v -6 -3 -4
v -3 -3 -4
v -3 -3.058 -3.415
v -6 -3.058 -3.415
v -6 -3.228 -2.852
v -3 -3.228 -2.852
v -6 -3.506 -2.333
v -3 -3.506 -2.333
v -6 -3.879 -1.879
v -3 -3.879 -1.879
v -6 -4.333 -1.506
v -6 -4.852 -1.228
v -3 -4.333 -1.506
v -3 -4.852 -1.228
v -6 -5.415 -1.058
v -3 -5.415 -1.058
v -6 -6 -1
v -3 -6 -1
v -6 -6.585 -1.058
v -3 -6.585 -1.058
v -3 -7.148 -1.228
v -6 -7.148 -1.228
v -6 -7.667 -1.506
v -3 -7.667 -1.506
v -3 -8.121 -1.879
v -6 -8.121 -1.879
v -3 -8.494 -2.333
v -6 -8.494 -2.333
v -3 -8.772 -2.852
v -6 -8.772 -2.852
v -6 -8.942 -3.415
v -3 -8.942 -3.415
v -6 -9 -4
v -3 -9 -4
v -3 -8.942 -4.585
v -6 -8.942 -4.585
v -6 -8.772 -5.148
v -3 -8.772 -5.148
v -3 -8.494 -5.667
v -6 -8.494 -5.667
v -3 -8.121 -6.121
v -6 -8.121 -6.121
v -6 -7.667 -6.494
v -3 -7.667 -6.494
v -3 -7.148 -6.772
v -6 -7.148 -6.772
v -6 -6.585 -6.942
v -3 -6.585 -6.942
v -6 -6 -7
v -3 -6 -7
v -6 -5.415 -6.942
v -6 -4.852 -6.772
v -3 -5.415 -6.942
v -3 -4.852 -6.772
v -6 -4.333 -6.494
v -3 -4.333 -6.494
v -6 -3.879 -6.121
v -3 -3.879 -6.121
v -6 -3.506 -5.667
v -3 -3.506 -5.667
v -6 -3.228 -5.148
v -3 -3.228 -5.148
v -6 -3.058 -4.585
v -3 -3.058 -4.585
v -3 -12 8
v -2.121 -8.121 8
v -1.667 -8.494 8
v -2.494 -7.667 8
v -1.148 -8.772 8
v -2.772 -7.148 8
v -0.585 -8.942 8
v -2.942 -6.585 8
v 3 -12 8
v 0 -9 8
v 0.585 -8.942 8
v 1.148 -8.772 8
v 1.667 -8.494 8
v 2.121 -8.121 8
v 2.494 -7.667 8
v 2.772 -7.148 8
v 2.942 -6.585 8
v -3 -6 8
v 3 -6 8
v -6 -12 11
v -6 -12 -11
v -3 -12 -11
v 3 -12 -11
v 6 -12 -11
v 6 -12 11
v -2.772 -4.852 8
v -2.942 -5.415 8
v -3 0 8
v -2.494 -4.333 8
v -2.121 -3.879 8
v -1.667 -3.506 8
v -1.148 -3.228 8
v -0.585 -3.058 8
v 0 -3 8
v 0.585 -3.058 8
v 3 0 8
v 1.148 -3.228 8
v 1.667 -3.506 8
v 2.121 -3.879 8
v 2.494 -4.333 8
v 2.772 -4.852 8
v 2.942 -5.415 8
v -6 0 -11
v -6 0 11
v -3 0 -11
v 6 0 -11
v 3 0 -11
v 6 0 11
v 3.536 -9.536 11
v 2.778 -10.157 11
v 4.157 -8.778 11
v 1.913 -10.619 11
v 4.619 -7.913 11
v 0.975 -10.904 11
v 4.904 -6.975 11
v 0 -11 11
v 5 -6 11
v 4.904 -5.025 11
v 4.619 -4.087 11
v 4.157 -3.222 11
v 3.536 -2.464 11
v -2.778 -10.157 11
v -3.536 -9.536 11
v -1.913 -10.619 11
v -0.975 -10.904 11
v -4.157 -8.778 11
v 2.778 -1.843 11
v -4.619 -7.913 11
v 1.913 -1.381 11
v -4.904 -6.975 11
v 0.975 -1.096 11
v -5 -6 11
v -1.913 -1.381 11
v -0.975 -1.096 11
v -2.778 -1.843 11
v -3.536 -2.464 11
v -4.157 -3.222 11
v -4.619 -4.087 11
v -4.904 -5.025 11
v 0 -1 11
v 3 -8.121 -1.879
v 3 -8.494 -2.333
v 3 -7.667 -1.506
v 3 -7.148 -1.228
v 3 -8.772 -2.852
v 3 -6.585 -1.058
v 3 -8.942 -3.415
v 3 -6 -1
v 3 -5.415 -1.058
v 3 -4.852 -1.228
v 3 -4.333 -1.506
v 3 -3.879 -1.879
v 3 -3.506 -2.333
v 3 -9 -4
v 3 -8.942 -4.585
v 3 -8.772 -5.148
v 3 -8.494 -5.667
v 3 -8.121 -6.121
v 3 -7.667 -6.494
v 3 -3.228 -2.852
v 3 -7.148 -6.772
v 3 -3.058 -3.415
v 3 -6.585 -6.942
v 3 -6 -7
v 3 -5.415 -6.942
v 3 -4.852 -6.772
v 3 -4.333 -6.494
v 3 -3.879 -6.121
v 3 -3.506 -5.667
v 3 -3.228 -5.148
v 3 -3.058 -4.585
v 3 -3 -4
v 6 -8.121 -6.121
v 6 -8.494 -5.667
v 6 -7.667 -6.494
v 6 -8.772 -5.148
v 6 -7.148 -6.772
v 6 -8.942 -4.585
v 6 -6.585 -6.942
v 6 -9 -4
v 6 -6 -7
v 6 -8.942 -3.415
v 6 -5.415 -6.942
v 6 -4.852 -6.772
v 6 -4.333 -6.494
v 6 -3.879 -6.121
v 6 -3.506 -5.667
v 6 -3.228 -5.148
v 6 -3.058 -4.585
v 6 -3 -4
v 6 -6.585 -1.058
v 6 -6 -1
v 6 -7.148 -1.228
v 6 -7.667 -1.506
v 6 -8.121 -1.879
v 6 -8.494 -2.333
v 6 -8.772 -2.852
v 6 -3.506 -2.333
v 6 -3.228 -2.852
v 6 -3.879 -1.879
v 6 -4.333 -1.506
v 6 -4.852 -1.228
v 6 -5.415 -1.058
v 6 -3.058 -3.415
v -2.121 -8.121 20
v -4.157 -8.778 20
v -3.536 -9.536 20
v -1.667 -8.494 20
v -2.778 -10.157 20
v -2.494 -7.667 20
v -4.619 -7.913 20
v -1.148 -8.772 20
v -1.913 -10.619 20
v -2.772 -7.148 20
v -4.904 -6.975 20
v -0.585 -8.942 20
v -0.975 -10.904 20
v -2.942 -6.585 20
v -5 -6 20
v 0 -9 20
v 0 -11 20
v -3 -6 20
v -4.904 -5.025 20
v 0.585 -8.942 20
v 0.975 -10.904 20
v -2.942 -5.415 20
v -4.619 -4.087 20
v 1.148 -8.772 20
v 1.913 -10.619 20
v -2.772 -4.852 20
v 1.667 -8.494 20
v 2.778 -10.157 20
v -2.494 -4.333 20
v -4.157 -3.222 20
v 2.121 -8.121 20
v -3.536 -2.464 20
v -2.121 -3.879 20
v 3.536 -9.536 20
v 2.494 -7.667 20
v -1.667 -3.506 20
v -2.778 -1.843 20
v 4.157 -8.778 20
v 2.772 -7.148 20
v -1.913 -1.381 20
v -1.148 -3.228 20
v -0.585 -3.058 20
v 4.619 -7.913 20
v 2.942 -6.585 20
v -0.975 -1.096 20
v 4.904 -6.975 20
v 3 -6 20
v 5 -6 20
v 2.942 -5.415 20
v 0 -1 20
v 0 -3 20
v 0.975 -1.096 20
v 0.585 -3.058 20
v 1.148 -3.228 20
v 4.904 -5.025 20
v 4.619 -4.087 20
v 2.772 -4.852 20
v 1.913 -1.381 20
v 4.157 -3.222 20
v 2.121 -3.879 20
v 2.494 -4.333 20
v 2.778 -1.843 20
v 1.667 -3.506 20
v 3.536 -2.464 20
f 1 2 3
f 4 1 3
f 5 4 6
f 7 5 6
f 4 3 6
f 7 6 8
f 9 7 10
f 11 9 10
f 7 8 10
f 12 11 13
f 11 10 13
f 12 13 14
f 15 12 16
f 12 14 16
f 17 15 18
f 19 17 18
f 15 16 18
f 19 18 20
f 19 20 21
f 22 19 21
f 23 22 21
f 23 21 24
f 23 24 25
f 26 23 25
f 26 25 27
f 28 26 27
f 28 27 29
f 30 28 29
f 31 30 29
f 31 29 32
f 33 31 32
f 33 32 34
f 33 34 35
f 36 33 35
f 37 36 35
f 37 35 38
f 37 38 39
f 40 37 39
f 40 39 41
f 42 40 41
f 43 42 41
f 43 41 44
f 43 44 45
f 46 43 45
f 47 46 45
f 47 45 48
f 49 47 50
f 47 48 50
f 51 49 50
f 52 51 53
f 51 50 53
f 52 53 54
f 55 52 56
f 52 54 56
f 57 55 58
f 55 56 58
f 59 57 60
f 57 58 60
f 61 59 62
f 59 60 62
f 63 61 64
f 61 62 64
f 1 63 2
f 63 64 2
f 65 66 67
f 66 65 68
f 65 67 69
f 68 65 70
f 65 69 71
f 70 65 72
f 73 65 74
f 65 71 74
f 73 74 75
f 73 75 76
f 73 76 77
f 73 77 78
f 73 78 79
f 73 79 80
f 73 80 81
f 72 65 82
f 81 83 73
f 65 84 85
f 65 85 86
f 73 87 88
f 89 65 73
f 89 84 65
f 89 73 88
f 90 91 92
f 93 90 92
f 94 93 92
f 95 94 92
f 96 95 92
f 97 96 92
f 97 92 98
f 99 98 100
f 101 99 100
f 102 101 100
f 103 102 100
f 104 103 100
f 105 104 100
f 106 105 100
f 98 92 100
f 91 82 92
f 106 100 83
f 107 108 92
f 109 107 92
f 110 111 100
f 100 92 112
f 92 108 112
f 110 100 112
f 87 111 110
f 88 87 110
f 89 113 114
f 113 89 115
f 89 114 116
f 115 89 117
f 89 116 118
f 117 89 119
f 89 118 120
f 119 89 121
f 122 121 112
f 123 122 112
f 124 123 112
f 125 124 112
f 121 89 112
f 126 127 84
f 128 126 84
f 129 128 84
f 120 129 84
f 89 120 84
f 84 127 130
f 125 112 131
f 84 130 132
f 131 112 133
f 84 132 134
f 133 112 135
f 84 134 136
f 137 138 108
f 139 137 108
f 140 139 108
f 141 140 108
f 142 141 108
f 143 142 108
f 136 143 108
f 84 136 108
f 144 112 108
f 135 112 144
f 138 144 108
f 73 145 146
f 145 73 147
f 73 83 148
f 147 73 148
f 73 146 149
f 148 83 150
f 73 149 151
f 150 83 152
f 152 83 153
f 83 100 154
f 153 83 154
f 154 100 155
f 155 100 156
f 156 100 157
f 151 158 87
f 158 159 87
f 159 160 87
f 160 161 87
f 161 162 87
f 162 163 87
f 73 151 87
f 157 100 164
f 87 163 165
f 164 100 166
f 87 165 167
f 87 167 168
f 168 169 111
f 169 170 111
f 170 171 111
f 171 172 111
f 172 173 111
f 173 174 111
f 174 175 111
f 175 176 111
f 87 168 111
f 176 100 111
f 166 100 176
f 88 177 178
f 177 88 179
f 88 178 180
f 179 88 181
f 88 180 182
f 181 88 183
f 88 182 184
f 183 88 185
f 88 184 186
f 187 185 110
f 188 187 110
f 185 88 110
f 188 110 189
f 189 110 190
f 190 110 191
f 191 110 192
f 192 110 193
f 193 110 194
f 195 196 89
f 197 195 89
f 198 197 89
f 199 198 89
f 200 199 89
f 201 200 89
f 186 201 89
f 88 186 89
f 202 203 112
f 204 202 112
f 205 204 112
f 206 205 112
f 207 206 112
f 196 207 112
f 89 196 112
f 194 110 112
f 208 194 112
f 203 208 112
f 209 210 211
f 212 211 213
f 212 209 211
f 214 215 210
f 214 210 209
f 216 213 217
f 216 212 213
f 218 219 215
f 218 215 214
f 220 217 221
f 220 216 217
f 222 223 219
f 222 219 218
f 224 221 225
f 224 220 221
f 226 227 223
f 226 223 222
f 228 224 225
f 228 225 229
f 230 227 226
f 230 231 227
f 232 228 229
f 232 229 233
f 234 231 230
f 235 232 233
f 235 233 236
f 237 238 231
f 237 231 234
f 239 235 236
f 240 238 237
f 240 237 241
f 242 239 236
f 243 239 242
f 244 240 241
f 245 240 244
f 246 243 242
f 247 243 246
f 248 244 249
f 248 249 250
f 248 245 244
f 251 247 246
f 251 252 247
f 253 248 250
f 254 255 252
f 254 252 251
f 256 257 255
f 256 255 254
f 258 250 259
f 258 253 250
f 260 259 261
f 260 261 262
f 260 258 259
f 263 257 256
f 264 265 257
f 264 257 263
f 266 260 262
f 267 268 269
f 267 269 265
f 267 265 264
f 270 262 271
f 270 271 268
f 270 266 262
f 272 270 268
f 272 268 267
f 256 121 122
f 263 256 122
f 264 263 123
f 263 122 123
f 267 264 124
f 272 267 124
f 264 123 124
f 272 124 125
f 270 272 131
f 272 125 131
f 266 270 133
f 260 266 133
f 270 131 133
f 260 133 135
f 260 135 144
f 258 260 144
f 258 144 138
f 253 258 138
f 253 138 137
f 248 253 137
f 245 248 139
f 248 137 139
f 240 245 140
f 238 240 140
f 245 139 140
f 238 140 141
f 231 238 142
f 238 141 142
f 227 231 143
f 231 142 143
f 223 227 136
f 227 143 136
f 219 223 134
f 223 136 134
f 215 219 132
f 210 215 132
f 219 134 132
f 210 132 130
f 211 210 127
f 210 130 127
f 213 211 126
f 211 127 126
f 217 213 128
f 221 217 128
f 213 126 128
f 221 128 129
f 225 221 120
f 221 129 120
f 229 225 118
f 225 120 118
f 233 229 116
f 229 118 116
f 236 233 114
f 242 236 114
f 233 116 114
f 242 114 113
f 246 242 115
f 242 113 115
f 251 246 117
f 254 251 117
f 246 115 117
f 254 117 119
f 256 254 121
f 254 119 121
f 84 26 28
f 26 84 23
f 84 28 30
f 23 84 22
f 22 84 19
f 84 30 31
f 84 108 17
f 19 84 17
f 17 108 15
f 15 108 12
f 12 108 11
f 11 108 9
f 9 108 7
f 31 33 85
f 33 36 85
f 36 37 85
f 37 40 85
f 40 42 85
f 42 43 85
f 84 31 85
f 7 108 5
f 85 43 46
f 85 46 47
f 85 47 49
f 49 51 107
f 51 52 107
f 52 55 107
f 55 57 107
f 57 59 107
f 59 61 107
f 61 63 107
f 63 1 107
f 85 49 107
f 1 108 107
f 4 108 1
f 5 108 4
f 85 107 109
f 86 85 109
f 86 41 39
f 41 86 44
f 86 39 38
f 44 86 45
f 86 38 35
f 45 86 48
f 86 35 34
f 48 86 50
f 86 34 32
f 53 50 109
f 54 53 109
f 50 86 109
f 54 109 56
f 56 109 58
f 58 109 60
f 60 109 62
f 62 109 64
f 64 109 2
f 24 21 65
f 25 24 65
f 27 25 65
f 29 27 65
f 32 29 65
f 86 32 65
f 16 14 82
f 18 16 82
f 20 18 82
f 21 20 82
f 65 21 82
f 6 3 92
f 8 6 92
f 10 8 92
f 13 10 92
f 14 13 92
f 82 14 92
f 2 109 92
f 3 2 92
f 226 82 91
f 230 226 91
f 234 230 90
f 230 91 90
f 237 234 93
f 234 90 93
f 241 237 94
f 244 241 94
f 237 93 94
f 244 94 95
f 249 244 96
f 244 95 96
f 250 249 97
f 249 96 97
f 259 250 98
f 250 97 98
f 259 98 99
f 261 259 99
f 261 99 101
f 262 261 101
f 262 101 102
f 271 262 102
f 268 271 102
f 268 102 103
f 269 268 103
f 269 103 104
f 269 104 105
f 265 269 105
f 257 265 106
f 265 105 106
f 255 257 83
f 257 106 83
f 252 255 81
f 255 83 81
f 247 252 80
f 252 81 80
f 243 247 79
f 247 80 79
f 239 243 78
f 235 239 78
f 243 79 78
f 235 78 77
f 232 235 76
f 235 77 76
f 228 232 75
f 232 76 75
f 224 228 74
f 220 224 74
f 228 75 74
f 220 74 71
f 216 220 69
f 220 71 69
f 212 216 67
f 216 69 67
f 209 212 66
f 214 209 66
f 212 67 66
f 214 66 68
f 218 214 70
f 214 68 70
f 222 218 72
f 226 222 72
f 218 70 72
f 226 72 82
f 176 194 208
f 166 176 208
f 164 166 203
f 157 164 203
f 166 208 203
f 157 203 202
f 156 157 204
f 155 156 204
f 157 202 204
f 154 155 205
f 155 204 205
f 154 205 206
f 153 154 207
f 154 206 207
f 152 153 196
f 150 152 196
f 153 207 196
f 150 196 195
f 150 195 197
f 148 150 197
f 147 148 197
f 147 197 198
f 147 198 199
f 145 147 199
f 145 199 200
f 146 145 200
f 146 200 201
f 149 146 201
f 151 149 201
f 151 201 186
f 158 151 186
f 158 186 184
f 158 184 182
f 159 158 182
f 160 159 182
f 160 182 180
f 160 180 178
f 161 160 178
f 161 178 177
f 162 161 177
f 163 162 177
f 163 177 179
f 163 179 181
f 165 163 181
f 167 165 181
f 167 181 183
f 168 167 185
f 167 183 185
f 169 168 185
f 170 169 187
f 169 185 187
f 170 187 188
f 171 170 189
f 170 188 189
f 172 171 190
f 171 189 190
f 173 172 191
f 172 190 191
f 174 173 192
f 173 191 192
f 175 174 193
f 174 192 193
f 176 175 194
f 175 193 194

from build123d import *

# Parameters (mm, degrees)
F1_DEPTH = 12
F2_R     = 5
F3_DEPTH = 9
F5_D     = 6
F7_D     = 6


with BuildPart() as f1:
    # F0 (on Front) → F1 (new body)
    with BuildSketch(Plane.XZ):
        Polygon((3, -11), (6, -11), (6, 11), (-6, 11), (-6, -11), (-3, -11), (-3, 8), (3, 8), align=None)
    extrude(amount=F1_DEPTH)

    # F2 (on face) → F3 (join)
    with BuildSketch(Plane.XY.offset(11)):
        with Locations((0, -6)):
            Circle(F2_R)
    extrude(amount=F3_DEPTH)

    # F5 (through all)
    with Locations(Plane.XY.offset(20)):
        with Locations((0, -6)):
            Hole(F5_D / 2)

    # F7 (through all)
    with Locations(Plane(origin=(-6, 0, 0), x_dir=(0, -1, 0), z_dir=(-1, 0, 0))):
        with Locations((6, -4)):
            Hole(F7_D / 2)


solid = f1.part
